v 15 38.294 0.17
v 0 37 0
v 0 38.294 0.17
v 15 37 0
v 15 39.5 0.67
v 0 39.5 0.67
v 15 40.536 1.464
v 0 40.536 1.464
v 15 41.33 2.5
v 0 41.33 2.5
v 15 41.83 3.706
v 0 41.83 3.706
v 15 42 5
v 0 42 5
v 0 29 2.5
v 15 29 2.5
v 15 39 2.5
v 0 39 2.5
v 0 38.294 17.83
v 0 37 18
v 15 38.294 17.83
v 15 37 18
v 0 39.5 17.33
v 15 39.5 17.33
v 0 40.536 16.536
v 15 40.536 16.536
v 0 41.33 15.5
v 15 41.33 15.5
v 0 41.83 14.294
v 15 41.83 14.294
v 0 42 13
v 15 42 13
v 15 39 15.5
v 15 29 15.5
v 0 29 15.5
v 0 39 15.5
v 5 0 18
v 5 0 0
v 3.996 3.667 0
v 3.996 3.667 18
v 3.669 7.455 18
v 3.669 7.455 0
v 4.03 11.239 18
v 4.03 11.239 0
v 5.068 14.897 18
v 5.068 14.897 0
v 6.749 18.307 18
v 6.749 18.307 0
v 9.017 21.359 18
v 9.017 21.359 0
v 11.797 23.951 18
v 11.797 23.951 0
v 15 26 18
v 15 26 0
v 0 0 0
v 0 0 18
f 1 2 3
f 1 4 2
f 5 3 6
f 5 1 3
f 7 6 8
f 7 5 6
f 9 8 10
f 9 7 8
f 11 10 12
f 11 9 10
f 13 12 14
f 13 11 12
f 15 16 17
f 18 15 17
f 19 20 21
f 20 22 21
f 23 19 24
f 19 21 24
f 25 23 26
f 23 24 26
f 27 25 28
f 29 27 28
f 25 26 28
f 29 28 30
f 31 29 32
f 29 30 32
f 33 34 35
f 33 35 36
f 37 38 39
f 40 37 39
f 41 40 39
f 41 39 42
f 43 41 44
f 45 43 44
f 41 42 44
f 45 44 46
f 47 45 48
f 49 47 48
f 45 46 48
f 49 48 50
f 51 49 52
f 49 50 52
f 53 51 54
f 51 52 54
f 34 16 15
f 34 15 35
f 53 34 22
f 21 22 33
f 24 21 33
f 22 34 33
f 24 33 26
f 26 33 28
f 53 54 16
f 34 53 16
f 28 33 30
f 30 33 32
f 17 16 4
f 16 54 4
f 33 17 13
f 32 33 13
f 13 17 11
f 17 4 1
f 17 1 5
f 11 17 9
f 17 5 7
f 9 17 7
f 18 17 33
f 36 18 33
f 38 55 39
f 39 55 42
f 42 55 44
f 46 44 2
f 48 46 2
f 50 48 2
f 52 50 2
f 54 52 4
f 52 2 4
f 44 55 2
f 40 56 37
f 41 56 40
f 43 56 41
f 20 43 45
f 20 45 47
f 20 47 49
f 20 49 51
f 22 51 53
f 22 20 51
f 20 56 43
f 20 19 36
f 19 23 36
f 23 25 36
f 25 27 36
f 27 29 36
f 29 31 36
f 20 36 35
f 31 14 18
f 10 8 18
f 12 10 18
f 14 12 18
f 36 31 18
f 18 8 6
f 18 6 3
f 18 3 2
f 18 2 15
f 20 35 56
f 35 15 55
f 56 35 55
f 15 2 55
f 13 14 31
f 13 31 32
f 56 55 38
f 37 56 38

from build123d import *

# Parameters (mm, degrees)
F0_W     = 15
F0_H     = 12
F1_DEPTH = 18
F2_W     = 10
F2_H     = 13
F3_DEPTH = 25
F4_R     = 5


with BuildPart() as f1:
    # F0 (on Top) → F1 (new body)
    with BuildSketch(Plane.XY):
        with BuildLine():
            Line((0, 30), (0, 0))
            Line((0, 0), (5, 0))
            ThreePointArc((5, 0), (5.06842, 14.896762), (15, 26))
            Line((15, 26), (15, 30))
            Line((15, 30), (0, 30))
        make_face()
        with Locations((7.5, 36)):
            Rectangle(F0_W, F0_H)
    extrude(amount=F1_DEPTH)

    # F2 (on face) → F3 (cut)
    with BuildSketch(Plane.YZ.offset(15)):
        with Locations((34, 9)):
            Rectangle(F2_W, F2_H)
    extrude(amount=-F3_DEPTH, mode=Mode.SUBTRACT)

    # F4
    f4_edges = [f1.edges().sort_by_distance(p)[0] for p in [
        (7.5, 42, 18),
        (7.5, 42, 0),
    ]]
    fillet(f4_edges, radius=F4_R)


solid = f1.part
